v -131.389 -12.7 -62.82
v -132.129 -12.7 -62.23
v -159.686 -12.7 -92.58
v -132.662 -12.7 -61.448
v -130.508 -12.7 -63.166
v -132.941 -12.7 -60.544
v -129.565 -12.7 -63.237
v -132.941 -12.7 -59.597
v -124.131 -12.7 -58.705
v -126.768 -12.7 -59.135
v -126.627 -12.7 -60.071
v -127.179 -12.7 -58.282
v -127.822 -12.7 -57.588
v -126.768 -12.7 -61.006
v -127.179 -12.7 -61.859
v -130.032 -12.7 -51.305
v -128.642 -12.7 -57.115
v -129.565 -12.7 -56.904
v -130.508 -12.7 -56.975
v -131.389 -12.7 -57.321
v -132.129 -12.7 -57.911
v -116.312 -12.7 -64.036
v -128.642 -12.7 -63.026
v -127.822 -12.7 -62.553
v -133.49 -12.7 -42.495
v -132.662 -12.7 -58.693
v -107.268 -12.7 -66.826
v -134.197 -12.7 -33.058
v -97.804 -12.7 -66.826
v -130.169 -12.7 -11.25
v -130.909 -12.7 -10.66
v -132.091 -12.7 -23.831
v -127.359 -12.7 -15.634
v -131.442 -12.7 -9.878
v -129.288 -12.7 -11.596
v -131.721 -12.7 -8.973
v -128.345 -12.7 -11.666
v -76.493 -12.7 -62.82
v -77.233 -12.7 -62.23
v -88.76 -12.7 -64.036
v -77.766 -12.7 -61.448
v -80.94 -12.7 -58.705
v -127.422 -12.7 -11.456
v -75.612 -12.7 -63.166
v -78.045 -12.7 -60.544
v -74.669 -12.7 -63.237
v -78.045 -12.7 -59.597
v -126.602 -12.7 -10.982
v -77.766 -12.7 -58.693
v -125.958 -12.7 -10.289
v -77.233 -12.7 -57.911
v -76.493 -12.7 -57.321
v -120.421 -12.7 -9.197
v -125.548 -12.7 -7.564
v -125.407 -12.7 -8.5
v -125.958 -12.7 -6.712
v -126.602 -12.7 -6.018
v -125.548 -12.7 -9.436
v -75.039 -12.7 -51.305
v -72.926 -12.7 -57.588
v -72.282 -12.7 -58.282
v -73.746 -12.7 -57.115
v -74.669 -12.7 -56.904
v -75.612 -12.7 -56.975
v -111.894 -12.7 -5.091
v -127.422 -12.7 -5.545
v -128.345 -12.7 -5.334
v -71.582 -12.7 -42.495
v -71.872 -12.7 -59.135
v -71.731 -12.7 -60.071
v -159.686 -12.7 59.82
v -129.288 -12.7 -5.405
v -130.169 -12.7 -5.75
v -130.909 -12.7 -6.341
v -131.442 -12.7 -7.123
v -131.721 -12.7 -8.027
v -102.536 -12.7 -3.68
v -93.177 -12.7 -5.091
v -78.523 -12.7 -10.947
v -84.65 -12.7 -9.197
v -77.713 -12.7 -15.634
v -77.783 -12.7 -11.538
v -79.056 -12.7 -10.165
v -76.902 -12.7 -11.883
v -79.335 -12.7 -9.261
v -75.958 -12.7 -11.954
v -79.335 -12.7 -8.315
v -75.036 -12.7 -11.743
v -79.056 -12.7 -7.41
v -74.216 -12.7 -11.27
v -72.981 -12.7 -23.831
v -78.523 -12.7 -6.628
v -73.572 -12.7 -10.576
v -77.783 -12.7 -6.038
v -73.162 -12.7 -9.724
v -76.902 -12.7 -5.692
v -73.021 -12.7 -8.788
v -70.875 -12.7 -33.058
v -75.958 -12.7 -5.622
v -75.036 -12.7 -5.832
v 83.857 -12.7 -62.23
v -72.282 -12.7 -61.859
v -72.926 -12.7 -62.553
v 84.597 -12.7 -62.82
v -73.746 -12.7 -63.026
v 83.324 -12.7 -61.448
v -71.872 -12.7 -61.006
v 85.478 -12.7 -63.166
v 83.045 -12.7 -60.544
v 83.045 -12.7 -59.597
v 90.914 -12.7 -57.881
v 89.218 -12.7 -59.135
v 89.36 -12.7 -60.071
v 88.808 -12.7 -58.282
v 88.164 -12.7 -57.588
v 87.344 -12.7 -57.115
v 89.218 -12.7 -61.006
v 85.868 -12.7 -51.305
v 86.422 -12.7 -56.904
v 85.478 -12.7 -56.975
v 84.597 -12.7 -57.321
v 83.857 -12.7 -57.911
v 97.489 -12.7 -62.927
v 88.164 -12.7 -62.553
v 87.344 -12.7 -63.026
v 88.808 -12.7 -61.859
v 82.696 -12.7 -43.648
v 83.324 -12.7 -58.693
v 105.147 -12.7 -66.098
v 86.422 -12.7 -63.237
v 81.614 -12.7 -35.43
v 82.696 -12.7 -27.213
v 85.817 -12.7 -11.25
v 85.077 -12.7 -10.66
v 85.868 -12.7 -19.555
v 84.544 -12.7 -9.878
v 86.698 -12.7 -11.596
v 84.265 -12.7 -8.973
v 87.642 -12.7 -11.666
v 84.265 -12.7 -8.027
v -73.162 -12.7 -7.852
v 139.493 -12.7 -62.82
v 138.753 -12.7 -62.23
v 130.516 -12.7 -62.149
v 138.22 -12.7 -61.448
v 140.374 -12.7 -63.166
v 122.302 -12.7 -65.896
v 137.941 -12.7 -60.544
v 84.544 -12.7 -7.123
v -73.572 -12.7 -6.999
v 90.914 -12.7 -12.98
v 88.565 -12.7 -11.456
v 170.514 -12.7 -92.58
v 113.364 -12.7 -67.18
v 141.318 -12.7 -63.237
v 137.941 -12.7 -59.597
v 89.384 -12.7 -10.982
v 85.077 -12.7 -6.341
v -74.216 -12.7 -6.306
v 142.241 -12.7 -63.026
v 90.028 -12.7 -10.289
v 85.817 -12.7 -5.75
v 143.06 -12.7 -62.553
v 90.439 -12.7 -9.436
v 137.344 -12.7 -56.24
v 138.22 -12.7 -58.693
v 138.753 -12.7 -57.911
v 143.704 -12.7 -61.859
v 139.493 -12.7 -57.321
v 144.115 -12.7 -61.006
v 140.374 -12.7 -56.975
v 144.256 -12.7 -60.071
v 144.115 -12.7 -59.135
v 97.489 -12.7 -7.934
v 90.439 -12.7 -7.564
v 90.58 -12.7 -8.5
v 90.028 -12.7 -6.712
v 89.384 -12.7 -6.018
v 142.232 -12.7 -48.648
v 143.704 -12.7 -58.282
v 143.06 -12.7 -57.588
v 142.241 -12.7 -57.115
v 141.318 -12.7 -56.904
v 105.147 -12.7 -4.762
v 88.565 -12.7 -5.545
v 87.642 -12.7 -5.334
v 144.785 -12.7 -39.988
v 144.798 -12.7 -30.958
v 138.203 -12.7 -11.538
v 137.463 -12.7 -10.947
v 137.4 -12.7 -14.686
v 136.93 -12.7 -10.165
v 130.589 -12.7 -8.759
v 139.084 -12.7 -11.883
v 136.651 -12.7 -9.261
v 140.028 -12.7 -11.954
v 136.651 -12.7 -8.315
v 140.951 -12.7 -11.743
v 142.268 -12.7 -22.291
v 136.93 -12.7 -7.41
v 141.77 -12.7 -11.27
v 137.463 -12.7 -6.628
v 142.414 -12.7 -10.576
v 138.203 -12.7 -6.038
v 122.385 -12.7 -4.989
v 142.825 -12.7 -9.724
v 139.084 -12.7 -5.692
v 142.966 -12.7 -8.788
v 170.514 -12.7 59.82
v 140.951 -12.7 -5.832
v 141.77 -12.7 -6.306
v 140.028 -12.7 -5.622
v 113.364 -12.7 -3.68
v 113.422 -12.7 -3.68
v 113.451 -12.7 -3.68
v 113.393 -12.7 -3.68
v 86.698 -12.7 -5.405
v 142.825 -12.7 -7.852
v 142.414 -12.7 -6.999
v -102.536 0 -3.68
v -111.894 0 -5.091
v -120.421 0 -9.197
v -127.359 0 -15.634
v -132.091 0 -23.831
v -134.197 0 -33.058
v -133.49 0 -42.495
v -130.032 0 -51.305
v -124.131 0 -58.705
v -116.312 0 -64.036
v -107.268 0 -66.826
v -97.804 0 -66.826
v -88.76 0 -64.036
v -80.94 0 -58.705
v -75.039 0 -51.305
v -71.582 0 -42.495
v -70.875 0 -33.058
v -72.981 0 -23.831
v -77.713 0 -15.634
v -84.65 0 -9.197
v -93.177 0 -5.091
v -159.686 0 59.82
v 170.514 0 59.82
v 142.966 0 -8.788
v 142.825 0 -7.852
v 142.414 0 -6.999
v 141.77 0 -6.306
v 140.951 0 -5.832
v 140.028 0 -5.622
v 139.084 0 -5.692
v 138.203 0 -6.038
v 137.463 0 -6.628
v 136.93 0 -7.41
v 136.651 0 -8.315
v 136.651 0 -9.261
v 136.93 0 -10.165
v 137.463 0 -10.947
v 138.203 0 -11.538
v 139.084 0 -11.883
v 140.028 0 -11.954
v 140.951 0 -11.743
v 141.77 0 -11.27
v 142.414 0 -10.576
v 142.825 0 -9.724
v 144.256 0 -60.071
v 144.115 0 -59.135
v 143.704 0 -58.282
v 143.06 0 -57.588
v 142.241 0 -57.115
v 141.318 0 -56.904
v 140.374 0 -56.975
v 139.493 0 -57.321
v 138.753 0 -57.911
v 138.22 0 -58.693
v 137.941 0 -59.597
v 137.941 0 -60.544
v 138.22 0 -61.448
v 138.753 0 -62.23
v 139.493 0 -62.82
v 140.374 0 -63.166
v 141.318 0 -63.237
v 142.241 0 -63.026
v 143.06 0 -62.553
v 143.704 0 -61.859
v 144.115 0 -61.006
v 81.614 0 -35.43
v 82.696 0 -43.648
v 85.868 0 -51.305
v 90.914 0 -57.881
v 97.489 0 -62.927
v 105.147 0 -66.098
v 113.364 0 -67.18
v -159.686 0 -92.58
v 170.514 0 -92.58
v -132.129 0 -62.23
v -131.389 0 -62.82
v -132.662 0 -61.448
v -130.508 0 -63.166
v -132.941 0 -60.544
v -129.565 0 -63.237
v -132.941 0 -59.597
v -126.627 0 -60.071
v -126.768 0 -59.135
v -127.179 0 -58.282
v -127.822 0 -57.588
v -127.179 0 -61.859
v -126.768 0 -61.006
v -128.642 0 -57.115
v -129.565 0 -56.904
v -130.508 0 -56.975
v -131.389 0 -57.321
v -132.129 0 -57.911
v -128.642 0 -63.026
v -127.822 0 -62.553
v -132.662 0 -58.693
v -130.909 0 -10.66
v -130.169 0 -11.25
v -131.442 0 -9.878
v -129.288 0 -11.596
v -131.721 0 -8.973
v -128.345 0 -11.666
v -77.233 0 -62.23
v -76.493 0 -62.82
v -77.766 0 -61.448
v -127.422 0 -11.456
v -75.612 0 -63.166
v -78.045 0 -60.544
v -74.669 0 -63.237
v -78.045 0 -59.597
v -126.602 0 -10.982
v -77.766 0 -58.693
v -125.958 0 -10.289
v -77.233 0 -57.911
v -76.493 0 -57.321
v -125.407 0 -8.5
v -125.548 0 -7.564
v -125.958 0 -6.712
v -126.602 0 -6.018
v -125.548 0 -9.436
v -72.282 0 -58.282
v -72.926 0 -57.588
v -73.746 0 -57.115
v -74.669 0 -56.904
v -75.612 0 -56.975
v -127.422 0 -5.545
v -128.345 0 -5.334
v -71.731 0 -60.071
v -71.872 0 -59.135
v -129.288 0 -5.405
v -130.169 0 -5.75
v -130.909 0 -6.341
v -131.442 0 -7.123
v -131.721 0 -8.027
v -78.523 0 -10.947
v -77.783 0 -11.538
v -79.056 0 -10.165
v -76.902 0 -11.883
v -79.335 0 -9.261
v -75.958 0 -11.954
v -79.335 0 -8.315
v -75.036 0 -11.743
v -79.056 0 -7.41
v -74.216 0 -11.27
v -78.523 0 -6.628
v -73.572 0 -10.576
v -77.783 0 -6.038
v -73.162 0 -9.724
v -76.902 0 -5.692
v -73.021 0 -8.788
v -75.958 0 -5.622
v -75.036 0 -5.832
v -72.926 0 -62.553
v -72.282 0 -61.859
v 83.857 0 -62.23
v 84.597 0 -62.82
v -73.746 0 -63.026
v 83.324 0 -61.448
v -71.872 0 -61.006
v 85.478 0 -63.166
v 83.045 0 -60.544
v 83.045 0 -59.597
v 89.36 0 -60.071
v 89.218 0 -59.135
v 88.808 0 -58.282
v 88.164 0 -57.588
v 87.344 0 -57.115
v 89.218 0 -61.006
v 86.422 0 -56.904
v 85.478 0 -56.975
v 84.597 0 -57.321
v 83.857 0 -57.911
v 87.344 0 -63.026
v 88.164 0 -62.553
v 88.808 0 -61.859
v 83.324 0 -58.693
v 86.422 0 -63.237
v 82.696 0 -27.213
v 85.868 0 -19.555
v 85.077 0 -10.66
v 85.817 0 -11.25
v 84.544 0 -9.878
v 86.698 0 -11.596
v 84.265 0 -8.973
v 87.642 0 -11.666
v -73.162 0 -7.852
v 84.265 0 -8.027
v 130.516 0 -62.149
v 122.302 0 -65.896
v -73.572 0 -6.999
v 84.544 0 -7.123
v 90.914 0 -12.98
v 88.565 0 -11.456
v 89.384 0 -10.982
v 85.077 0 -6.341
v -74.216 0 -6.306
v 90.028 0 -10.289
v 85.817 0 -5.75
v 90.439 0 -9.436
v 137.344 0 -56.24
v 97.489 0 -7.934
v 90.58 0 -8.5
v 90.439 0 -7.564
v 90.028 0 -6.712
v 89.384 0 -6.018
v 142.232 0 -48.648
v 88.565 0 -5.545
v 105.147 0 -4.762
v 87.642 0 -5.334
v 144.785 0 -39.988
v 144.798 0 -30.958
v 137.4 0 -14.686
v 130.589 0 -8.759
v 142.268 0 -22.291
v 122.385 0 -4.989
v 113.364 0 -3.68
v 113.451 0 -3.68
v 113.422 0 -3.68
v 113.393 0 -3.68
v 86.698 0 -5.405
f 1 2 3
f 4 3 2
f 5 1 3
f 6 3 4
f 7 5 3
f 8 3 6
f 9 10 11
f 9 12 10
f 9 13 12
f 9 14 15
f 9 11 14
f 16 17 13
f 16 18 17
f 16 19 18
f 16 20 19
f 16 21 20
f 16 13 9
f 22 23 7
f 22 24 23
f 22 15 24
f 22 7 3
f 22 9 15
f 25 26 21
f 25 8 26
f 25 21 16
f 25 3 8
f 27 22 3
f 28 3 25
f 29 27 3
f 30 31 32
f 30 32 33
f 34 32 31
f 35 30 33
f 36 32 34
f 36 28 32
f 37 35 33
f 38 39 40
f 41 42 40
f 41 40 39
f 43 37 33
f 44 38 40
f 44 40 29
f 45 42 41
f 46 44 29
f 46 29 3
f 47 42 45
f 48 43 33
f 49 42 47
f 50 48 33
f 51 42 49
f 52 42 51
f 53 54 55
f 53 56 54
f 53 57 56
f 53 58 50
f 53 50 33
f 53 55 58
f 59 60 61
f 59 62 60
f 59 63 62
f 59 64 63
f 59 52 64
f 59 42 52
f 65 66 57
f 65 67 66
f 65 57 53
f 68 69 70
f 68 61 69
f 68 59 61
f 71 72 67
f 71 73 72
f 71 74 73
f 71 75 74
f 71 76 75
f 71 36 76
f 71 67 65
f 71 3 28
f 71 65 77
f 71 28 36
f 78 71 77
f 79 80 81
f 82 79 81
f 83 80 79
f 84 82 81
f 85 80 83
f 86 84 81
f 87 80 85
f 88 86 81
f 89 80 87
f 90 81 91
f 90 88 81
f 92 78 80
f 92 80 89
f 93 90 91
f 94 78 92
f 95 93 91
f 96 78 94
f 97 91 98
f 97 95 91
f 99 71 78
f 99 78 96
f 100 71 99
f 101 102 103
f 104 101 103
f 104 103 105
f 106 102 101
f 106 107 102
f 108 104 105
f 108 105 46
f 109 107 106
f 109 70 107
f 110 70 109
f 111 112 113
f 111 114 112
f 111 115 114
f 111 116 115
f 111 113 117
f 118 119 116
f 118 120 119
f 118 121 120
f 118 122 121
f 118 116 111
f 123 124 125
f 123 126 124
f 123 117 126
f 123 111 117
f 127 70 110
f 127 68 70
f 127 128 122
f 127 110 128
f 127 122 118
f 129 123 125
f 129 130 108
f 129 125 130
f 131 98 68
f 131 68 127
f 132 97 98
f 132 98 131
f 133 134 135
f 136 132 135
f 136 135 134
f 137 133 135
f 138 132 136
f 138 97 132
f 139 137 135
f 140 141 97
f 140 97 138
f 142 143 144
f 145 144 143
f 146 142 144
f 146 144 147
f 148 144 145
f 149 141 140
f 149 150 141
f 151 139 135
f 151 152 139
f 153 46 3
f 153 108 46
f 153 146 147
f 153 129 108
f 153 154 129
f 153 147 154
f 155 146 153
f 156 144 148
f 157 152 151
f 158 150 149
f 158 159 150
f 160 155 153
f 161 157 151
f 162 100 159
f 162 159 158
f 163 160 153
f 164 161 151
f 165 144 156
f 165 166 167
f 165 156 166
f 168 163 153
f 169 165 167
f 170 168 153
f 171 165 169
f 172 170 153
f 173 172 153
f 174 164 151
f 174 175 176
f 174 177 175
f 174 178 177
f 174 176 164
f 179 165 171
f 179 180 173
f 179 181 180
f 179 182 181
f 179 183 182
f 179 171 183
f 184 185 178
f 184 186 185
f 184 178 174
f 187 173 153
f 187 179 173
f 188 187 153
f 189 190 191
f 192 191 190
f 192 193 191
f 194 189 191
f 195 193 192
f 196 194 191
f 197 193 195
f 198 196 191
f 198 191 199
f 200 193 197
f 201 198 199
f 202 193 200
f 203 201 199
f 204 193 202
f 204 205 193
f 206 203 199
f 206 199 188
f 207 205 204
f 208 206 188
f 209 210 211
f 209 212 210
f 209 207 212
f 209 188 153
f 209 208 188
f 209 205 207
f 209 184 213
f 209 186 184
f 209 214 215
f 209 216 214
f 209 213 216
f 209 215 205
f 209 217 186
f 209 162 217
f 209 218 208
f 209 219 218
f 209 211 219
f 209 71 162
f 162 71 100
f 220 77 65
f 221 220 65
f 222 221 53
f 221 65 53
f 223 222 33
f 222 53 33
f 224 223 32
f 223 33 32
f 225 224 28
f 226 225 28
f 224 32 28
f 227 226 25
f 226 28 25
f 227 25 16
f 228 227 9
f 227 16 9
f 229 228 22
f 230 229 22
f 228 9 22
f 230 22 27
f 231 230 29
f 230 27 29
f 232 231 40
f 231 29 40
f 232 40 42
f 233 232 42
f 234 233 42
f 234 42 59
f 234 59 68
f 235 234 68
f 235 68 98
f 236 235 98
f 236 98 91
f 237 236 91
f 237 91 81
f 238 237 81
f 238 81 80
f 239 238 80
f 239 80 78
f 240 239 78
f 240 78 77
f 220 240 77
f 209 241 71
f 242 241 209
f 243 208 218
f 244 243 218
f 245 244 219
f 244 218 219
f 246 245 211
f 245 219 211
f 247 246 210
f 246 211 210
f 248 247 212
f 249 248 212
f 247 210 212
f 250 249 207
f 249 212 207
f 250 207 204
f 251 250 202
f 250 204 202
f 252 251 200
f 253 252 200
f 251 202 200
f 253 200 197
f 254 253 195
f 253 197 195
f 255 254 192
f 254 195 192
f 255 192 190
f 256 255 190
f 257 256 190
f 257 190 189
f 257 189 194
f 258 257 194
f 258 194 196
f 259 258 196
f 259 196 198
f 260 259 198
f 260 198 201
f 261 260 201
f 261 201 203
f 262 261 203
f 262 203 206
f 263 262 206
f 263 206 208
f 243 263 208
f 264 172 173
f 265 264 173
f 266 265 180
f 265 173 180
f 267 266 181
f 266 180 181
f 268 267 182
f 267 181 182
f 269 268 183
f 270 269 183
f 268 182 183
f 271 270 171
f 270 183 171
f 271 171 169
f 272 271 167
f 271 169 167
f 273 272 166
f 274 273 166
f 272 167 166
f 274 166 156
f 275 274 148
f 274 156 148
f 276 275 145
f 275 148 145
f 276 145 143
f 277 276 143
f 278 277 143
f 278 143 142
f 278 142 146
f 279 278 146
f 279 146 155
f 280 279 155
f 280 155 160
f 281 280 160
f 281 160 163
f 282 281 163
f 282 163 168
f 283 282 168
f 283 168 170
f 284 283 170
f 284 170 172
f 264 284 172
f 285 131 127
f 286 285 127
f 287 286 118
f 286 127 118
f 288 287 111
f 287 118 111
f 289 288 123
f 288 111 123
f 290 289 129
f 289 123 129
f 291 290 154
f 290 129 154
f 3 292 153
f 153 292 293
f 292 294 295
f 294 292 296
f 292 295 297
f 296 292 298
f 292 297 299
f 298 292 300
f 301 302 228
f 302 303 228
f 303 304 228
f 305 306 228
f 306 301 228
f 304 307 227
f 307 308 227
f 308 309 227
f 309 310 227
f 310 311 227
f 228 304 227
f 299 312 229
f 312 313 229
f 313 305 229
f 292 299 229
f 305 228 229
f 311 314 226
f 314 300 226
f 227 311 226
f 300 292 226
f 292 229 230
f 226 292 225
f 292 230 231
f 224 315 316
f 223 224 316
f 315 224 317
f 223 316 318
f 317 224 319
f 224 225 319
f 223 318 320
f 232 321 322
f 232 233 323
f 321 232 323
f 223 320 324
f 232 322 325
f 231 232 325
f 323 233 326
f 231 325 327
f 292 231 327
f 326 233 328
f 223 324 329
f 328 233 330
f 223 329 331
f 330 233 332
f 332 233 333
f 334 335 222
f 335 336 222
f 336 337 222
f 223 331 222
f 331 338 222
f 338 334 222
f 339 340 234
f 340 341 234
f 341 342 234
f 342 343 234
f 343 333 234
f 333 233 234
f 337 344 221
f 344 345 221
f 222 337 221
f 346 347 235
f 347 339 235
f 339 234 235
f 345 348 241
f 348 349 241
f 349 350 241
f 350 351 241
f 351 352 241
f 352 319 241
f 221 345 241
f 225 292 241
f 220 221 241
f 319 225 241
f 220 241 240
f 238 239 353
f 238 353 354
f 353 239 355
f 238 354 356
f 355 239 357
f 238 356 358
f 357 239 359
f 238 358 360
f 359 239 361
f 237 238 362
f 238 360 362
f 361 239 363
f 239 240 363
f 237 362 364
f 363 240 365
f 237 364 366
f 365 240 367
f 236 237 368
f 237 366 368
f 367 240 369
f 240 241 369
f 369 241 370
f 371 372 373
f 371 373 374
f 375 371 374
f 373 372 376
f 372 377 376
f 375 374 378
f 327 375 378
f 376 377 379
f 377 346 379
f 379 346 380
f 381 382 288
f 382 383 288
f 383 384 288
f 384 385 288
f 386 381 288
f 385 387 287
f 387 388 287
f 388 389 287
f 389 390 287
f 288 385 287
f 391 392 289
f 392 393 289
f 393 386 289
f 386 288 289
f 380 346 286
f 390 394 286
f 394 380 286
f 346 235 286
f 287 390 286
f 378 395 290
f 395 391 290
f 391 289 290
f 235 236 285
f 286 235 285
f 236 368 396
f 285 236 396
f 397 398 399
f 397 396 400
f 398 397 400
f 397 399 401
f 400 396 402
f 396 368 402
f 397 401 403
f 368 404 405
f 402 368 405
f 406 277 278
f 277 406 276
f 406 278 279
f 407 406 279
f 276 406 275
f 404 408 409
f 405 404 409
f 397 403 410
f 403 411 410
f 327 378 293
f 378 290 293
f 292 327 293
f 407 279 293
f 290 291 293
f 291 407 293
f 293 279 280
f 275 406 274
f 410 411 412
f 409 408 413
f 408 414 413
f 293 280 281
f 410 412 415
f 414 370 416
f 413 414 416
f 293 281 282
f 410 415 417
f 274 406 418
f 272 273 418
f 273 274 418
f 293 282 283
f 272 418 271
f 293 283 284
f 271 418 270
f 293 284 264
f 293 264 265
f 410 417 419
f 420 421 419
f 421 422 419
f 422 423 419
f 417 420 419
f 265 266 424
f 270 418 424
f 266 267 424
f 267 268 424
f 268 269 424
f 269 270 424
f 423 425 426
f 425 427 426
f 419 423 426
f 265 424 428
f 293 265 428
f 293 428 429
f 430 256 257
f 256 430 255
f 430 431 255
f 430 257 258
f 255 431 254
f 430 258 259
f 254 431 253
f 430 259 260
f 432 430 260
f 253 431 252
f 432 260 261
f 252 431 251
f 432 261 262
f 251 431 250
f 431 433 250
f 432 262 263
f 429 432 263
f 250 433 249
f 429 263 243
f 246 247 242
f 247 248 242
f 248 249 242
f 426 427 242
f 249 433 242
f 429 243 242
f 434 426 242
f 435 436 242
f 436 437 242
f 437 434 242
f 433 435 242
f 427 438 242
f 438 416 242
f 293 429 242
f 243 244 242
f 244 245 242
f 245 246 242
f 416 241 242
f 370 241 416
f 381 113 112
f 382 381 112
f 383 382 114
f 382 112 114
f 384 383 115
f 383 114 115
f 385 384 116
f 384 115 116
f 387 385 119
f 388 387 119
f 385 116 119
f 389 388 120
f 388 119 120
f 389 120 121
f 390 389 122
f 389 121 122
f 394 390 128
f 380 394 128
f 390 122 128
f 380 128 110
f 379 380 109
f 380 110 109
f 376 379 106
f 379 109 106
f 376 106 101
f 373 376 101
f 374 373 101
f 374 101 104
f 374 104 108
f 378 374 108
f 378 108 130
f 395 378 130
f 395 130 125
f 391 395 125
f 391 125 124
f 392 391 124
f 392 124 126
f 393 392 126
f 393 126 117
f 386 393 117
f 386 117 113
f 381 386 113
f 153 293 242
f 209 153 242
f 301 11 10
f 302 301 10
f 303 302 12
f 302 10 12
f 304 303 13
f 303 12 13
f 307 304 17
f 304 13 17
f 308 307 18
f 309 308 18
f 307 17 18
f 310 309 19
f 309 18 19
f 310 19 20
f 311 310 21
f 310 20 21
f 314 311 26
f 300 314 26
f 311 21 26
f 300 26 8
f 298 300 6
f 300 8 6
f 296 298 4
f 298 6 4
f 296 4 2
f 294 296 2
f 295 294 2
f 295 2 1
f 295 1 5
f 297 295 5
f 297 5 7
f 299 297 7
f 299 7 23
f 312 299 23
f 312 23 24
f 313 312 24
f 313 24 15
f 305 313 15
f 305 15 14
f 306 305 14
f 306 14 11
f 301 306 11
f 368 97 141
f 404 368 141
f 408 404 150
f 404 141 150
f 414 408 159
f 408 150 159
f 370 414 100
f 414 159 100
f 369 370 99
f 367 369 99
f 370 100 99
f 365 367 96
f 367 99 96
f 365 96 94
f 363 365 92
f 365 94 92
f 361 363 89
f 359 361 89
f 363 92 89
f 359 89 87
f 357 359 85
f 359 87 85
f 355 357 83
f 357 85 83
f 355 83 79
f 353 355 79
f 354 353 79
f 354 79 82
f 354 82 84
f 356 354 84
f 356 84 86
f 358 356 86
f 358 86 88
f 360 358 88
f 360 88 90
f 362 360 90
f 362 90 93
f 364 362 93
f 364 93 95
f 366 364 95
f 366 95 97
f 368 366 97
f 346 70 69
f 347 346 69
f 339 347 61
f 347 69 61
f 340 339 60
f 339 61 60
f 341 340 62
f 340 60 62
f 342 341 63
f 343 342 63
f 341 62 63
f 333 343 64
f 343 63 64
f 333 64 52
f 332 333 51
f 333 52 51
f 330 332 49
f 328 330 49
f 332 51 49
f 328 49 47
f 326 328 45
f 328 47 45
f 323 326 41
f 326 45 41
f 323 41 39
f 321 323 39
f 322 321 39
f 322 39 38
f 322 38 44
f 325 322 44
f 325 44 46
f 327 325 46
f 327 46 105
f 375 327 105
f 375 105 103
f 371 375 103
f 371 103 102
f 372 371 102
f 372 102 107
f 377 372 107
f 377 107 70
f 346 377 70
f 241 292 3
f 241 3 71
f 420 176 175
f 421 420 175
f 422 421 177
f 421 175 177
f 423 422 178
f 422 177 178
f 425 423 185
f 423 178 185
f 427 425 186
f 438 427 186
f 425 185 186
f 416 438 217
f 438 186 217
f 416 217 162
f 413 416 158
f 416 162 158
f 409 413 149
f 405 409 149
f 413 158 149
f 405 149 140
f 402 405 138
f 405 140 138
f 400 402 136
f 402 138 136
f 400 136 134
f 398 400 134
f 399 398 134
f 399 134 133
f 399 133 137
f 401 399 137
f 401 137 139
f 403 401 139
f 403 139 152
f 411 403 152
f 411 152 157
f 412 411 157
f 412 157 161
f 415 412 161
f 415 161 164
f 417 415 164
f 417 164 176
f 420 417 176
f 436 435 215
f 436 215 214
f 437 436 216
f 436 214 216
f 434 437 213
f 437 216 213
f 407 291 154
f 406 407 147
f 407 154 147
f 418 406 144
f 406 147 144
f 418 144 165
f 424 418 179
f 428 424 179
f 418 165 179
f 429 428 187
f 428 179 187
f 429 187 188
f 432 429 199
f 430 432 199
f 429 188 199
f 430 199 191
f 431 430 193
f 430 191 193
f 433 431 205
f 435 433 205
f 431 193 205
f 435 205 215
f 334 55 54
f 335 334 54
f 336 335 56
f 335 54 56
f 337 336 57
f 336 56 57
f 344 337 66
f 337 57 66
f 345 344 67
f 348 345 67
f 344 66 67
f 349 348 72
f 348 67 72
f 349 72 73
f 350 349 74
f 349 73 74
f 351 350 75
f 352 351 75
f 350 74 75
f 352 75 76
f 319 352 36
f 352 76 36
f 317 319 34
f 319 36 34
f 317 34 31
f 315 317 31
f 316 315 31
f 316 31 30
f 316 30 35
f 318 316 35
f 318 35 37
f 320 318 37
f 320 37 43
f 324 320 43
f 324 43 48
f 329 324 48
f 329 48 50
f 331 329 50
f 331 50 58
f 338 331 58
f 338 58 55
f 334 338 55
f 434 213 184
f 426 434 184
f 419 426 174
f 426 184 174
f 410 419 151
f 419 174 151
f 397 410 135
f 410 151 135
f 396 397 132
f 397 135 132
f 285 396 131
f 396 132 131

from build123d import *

# Parameters (mm, degrees)
F0_W     = 330.2
F0_H     = 152.4
F1_DEPTH = 12.7
F2_R     = 3.175
F3_DEPTH = 25.4


with BuildPart() as f1:
    # F0 (on Front) → F1 (new body)
    with BuildSketch(Plane.XZ):
        with Locations((5.4142102599, -16.3802644663)):
            Rectangle(F0_W, F0_H)
    extrude(amount=F1_DEPTH)

    # F2 (on face) → F3 (cut)
    with BuildSketch(Plane.XZ.offset(12.7)):
        with BuildLine():
            ThreePointArc((-70.7857897401, -35.4302644663), (-80.0851494374, -12.9796241636), (-102.5357897401, -3.6802644663))
            ThreePointArc((-102.5357897401, -3.6802644663), (-124.9864300428, -12.9796241636), (-134.2857897401, -35.4302644663))
            ThreePointArc((-134.2857897401, -35.4302644663), (-124.9864300428, -57.8809047689), (-102.5357897401, -67.1802644663))
            ThreePointArc((-102.5357897401, -67.1802644663), (-80.0851494374, -57.8809047689), (-70.7857897401, -35.4302644663))
        make_face()
        with BuildLine():
            ThreePointArc((81.6142102599, -35.4302644663), (90.9135700285, -57.8809048401), (113.3642104613, -67.1802644663))
            ThreePointArc((113.3642104613, -67.1802644663), (135.8148506338, -57.8809046977), (145.1142102599, -35.4302644663))
            ThreePointArc((145.1142102599, -35.4302644663), (135.8453787023, -13.0101938717), (113.4506155848, -3.6803820394))
            ThreePointArc((113.4506155848, -3.6803820394), (113.4074129624, -3.6802938596), (113.3642102599, -3.6802644663))
            ThreePointArc((113.3642102599, -3.6802644663), (90.9135699572, -12.9796241636), (81.6142102599, -35.4302644663))
        make_face()
        with Locations((-76.1955228105, -8.7878816322)):
            Circle(F2_R)
        with Locations((-128.5817733597, -8.500114777)):
            Circle(F2_R)
        with Locations((-129.8018724208, -60.0706152875)):
            Circle(F2_R)
        with Locations((-74.9057844611, -60.0706152875)):
            Circle(F2_R)
        with Locations((87.4046319652, -8.500114777)):
            Circle(F2_R)
        with Locations((139.7908825145, -8.7878816322)):
            Circle(F2_R)
        with Locations((141.0806208638, -60.0706152875)):
            Circle(F2_R)
        with Locations((86.1845329041, -60.0706152875)):
            Circle(F2_R)
    extrude(amount=-F3_DEPTH, mode=Mode.SUBTRACT)


solid = f1.part
